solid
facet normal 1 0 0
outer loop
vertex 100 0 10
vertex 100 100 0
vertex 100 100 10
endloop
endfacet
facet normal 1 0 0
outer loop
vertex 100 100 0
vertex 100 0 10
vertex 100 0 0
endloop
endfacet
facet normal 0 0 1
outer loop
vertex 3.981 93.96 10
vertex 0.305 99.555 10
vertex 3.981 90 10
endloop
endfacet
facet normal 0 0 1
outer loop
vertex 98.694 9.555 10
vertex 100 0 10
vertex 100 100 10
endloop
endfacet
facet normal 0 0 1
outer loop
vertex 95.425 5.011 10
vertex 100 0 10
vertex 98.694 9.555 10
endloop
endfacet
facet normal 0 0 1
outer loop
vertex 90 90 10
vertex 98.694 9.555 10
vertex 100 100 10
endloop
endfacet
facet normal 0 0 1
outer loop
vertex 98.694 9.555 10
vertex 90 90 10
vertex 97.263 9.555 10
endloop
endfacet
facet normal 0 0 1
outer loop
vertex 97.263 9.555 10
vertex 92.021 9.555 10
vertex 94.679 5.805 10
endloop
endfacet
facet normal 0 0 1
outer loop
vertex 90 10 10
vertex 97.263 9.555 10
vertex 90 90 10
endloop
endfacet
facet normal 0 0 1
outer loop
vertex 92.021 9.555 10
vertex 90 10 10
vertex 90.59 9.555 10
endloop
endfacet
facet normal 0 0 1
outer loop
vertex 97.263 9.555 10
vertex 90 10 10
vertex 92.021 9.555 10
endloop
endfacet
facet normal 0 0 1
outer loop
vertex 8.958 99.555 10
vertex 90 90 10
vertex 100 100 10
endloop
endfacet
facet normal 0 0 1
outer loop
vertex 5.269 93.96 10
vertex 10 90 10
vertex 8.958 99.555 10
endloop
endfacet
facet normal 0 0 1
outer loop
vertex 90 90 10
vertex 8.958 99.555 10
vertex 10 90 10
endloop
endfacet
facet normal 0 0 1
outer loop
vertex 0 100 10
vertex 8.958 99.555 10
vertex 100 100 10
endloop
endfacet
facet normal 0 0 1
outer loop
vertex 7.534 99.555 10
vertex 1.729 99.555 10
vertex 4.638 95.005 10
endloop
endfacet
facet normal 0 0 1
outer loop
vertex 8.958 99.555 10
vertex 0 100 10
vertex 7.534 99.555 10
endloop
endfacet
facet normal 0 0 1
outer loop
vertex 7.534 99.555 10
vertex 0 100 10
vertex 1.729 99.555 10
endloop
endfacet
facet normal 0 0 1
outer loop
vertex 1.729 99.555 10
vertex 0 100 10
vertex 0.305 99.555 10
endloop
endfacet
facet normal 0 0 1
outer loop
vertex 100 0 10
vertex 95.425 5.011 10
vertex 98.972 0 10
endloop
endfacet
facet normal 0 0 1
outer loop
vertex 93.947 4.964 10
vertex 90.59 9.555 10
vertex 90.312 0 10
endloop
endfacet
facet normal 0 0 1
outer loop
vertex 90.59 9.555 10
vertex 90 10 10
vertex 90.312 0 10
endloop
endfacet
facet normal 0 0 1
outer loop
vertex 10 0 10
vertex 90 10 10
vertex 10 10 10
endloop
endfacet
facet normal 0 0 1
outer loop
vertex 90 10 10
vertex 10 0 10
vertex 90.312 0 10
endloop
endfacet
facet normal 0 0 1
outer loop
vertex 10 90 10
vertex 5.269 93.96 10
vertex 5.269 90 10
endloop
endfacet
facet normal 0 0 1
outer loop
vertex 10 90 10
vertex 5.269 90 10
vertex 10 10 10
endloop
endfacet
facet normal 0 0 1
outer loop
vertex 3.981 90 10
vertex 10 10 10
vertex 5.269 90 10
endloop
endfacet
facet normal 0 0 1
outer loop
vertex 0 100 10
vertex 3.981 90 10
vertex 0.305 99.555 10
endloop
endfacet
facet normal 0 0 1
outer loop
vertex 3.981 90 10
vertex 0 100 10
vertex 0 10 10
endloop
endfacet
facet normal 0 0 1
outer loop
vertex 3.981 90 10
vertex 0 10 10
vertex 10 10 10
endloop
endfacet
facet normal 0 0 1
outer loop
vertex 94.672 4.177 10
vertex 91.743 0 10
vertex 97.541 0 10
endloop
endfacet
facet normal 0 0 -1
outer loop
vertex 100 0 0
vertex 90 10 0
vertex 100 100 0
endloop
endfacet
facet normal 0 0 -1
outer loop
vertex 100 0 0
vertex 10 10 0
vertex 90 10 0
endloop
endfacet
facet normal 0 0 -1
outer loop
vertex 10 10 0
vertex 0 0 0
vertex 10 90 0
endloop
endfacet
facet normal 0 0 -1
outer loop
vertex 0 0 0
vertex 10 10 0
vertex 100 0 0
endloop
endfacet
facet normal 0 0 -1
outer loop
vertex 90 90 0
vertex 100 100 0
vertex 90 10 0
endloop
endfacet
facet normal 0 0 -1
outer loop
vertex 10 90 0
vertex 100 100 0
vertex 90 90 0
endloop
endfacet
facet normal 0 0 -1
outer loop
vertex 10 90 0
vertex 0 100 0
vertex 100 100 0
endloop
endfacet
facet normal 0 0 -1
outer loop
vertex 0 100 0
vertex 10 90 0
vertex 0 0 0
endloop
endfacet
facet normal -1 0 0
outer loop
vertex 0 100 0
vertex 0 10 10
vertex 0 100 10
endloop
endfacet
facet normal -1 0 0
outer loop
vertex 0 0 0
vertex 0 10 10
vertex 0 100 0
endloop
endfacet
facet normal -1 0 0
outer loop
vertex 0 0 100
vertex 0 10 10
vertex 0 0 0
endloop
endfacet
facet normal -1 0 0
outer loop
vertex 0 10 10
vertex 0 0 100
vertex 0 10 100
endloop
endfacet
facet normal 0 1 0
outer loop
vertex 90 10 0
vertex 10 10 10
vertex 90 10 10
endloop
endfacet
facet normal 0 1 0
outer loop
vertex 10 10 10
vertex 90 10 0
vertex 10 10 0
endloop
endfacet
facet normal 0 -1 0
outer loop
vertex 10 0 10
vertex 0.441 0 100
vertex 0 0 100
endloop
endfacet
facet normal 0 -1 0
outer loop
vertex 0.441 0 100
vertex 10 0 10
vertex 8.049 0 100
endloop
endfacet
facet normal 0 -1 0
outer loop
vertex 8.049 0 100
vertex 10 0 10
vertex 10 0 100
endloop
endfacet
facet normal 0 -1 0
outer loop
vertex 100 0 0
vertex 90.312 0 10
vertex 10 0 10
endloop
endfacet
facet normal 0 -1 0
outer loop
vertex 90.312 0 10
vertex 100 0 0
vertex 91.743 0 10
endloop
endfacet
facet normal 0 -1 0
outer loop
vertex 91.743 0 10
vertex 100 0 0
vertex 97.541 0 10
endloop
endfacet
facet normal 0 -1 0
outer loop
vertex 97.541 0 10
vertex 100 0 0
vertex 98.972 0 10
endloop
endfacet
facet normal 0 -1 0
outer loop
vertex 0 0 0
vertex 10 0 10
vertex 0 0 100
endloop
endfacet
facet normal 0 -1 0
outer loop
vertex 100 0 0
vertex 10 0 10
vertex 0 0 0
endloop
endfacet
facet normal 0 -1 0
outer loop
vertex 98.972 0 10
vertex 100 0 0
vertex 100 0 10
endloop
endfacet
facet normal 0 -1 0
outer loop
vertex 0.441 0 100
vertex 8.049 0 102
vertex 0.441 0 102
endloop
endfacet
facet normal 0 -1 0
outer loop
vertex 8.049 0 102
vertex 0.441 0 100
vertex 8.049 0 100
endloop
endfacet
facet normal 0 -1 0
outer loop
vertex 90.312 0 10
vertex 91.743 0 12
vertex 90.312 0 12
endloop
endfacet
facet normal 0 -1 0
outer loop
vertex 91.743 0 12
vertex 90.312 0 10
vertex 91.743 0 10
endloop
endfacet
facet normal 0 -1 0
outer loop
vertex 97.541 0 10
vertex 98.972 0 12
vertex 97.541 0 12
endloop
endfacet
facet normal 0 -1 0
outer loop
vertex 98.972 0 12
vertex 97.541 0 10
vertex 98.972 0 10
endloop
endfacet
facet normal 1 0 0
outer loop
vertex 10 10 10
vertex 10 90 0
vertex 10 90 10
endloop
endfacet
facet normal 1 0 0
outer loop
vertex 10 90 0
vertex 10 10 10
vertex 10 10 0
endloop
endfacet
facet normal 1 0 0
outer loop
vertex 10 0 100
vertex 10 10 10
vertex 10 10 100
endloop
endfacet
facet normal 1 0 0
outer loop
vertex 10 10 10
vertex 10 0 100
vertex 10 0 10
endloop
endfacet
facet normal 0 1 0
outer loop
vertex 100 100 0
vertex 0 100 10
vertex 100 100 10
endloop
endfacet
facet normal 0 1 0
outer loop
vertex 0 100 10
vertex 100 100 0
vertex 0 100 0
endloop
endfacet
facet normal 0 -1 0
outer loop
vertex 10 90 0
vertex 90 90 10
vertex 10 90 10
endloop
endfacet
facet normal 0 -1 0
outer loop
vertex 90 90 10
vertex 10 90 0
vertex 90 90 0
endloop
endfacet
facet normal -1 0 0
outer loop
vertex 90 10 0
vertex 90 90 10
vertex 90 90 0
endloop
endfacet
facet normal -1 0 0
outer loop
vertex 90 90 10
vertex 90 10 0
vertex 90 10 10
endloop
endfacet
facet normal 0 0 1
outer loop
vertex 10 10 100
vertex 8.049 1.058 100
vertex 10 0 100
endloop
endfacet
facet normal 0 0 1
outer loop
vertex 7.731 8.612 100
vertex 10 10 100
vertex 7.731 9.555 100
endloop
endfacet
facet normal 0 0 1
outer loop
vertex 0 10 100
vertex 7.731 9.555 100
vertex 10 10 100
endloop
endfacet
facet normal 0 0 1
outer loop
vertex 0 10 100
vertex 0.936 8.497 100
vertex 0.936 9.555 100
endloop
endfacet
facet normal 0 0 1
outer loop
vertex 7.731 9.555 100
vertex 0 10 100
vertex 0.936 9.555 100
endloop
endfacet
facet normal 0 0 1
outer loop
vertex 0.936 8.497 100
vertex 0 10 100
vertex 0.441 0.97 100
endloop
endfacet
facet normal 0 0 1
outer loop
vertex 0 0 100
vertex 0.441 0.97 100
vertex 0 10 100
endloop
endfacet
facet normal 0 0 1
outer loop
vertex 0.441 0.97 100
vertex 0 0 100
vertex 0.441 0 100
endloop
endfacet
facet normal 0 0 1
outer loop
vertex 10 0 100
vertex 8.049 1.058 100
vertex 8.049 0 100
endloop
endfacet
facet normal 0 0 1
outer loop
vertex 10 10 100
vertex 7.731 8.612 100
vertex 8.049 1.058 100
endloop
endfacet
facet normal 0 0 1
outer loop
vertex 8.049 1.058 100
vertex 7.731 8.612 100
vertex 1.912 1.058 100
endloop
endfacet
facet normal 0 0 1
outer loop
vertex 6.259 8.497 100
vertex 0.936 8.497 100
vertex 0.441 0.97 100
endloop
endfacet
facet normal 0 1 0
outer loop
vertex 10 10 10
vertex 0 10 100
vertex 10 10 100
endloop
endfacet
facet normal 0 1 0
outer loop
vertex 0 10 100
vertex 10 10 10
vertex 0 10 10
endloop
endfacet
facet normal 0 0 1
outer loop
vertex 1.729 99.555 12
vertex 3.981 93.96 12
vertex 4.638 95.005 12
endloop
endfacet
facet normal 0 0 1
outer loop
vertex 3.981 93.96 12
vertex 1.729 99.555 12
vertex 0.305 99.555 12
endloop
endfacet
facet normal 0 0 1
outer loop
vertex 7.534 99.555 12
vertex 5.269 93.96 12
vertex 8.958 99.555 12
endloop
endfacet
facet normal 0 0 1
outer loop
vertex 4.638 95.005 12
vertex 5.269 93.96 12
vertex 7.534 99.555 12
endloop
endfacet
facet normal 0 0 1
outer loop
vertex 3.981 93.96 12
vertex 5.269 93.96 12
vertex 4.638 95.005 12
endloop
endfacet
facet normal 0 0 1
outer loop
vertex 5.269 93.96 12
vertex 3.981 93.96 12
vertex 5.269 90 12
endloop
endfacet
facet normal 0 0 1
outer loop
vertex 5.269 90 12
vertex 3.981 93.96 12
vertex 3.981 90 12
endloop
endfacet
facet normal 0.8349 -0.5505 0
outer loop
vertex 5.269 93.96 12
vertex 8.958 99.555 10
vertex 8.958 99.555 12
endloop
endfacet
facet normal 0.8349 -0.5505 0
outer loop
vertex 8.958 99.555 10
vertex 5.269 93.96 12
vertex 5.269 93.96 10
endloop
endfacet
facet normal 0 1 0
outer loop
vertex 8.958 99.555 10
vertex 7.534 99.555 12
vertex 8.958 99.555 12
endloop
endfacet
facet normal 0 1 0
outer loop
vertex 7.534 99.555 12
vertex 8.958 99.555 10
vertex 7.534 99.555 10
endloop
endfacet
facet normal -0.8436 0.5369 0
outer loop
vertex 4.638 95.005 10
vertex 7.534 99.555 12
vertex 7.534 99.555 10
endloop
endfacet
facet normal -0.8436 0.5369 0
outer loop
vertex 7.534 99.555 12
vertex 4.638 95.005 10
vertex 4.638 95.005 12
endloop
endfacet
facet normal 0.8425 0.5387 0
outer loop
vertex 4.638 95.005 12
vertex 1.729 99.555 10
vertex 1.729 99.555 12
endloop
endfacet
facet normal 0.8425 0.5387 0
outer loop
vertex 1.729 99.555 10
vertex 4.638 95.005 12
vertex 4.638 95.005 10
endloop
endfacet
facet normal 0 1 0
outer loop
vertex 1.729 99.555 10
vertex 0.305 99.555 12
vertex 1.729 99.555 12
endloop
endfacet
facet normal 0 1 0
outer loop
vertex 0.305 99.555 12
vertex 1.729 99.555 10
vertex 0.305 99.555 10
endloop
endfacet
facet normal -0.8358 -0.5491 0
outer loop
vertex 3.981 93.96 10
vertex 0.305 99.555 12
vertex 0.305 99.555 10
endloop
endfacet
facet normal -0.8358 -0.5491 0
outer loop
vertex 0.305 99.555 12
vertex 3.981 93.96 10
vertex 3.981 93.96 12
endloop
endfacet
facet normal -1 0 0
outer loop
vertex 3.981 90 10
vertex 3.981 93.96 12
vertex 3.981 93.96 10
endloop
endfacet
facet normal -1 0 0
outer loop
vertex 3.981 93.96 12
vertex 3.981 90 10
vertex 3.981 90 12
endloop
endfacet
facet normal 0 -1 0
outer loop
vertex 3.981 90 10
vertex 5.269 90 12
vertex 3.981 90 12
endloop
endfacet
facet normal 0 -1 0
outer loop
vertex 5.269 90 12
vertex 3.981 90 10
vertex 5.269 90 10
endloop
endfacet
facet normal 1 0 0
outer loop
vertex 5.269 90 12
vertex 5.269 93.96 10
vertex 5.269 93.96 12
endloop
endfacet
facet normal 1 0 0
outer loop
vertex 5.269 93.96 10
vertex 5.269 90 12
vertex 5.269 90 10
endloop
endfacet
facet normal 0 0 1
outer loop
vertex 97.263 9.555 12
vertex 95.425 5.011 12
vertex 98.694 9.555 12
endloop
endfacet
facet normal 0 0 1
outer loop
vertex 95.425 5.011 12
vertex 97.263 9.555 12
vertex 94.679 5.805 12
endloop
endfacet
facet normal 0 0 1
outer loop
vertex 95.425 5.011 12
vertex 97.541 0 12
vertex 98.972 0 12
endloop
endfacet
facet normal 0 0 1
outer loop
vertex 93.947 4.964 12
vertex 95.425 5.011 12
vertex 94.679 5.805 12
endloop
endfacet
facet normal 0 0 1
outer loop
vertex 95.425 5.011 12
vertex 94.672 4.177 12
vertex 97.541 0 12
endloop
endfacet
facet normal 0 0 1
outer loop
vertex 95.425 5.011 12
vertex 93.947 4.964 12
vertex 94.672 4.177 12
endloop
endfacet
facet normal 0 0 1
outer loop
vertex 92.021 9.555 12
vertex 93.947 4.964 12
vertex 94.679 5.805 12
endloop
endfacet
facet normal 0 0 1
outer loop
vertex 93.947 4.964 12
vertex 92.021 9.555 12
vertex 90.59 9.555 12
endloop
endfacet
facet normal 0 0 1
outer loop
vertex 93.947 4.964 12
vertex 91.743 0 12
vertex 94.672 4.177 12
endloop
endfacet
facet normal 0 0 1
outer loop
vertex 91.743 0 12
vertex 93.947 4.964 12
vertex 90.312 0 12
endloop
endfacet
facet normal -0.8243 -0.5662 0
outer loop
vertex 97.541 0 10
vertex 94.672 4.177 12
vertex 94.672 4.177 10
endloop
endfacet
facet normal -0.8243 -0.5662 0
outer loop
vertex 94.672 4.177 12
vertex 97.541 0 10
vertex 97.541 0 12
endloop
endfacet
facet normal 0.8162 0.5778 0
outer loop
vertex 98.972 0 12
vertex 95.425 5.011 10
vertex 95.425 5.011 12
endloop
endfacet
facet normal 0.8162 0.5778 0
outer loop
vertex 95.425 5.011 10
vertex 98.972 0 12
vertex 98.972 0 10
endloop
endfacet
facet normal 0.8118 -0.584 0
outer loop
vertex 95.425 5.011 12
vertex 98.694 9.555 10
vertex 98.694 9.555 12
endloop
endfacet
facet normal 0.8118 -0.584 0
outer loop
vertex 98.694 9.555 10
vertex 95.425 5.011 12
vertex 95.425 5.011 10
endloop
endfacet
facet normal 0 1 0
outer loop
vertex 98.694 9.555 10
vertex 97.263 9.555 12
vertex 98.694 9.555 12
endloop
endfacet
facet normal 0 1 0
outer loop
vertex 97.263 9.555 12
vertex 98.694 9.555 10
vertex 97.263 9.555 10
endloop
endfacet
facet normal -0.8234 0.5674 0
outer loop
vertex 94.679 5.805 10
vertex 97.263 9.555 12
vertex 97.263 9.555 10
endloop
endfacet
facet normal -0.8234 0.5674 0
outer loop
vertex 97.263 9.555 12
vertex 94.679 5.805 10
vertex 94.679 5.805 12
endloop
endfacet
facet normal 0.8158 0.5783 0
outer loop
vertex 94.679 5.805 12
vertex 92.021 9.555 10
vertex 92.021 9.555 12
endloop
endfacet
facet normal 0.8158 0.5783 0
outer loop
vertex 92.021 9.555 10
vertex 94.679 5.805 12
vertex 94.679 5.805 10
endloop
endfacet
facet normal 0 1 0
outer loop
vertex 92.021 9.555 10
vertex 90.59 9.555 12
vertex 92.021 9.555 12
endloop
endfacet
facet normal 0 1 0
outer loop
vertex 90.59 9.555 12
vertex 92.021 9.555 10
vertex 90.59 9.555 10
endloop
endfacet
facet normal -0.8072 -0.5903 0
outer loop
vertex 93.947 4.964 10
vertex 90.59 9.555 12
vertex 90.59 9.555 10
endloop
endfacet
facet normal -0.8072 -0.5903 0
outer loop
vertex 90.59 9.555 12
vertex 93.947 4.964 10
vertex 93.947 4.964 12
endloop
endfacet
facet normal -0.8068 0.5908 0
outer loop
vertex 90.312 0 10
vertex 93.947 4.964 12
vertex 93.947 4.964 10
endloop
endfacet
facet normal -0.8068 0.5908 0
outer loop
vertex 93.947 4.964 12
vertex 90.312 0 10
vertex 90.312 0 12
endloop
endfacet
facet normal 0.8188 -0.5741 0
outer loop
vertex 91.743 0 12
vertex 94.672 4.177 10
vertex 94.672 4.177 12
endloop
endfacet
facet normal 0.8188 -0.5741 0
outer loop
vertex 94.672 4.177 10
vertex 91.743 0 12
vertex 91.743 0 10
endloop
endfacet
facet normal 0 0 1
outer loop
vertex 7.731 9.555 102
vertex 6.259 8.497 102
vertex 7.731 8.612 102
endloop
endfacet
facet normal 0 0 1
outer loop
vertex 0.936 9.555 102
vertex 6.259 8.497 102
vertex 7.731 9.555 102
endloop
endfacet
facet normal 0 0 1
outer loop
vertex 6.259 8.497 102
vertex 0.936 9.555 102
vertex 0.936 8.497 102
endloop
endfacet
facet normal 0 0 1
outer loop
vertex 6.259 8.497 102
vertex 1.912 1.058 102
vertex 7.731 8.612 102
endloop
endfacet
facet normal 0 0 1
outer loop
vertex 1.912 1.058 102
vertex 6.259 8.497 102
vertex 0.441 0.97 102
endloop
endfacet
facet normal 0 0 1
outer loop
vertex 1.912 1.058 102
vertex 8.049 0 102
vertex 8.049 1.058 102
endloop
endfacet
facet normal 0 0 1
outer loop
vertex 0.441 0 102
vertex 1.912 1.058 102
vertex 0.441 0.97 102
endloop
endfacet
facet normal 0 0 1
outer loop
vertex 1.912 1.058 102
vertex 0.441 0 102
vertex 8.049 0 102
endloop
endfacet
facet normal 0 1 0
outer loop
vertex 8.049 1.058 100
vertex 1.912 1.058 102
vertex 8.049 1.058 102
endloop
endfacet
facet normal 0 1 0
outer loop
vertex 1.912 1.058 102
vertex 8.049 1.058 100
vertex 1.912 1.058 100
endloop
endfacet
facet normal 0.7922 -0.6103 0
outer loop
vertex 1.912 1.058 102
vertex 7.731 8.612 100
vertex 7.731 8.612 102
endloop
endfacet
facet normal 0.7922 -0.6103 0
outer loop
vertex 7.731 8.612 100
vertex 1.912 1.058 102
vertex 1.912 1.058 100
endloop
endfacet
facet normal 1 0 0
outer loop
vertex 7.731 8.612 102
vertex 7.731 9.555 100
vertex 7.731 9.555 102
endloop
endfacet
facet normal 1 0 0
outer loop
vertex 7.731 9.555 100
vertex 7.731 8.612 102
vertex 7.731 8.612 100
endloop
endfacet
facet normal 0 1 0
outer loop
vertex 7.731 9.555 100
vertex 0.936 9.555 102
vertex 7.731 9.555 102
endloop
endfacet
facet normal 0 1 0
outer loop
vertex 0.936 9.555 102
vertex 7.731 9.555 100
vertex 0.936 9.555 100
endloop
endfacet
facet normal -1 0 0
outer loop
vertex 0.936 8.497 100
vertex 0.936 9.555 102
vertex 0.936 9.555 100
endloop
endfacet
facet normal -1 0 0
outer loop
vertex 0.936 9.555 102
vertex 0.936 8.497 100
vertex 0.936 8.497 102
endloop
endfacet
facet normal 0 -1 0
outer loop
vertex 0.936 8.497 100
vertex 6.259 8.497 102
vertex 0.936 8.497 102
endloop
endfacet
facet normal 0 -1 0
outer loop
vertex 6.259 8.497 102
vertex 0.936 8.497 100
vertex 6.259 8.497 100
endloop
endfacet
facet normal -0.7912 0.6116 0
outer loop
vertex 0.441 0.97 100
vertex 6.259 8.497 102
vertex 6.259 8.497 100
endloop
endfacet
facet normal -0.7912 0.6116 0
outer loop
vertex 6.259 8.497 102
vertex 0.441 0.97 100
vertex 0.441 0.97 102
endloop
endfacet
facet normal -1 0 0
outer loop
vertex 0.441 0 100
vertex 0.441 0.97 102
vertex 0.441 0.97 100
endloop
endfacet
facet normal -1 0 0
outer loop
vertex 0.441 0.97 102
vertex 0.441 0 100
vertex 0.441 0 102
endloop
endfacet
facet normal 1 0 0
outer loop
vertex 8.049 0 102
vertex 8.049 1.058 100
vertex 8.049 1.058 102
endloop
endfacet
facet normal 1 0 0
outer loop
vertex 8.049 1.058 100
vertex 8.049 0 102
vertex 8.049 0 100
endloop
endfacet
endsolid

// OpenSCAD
l = 100;

cube([l,10,10]);
cube([10,l,10]);
translate([0,l-10,0]) cube([l,10,10]);
translate([l-10,0,0]) cube([10,l,10]);
cube([10,l,10]);
cube([10,10,l]);
translate([0,l-10,10]) linear_extrude(height=2) text("Y");
translate([l-10,0,10]) linear_extrude(height=2) text("X");
translate([0,0,l]) linear_extrude(height=2) text("Z");
